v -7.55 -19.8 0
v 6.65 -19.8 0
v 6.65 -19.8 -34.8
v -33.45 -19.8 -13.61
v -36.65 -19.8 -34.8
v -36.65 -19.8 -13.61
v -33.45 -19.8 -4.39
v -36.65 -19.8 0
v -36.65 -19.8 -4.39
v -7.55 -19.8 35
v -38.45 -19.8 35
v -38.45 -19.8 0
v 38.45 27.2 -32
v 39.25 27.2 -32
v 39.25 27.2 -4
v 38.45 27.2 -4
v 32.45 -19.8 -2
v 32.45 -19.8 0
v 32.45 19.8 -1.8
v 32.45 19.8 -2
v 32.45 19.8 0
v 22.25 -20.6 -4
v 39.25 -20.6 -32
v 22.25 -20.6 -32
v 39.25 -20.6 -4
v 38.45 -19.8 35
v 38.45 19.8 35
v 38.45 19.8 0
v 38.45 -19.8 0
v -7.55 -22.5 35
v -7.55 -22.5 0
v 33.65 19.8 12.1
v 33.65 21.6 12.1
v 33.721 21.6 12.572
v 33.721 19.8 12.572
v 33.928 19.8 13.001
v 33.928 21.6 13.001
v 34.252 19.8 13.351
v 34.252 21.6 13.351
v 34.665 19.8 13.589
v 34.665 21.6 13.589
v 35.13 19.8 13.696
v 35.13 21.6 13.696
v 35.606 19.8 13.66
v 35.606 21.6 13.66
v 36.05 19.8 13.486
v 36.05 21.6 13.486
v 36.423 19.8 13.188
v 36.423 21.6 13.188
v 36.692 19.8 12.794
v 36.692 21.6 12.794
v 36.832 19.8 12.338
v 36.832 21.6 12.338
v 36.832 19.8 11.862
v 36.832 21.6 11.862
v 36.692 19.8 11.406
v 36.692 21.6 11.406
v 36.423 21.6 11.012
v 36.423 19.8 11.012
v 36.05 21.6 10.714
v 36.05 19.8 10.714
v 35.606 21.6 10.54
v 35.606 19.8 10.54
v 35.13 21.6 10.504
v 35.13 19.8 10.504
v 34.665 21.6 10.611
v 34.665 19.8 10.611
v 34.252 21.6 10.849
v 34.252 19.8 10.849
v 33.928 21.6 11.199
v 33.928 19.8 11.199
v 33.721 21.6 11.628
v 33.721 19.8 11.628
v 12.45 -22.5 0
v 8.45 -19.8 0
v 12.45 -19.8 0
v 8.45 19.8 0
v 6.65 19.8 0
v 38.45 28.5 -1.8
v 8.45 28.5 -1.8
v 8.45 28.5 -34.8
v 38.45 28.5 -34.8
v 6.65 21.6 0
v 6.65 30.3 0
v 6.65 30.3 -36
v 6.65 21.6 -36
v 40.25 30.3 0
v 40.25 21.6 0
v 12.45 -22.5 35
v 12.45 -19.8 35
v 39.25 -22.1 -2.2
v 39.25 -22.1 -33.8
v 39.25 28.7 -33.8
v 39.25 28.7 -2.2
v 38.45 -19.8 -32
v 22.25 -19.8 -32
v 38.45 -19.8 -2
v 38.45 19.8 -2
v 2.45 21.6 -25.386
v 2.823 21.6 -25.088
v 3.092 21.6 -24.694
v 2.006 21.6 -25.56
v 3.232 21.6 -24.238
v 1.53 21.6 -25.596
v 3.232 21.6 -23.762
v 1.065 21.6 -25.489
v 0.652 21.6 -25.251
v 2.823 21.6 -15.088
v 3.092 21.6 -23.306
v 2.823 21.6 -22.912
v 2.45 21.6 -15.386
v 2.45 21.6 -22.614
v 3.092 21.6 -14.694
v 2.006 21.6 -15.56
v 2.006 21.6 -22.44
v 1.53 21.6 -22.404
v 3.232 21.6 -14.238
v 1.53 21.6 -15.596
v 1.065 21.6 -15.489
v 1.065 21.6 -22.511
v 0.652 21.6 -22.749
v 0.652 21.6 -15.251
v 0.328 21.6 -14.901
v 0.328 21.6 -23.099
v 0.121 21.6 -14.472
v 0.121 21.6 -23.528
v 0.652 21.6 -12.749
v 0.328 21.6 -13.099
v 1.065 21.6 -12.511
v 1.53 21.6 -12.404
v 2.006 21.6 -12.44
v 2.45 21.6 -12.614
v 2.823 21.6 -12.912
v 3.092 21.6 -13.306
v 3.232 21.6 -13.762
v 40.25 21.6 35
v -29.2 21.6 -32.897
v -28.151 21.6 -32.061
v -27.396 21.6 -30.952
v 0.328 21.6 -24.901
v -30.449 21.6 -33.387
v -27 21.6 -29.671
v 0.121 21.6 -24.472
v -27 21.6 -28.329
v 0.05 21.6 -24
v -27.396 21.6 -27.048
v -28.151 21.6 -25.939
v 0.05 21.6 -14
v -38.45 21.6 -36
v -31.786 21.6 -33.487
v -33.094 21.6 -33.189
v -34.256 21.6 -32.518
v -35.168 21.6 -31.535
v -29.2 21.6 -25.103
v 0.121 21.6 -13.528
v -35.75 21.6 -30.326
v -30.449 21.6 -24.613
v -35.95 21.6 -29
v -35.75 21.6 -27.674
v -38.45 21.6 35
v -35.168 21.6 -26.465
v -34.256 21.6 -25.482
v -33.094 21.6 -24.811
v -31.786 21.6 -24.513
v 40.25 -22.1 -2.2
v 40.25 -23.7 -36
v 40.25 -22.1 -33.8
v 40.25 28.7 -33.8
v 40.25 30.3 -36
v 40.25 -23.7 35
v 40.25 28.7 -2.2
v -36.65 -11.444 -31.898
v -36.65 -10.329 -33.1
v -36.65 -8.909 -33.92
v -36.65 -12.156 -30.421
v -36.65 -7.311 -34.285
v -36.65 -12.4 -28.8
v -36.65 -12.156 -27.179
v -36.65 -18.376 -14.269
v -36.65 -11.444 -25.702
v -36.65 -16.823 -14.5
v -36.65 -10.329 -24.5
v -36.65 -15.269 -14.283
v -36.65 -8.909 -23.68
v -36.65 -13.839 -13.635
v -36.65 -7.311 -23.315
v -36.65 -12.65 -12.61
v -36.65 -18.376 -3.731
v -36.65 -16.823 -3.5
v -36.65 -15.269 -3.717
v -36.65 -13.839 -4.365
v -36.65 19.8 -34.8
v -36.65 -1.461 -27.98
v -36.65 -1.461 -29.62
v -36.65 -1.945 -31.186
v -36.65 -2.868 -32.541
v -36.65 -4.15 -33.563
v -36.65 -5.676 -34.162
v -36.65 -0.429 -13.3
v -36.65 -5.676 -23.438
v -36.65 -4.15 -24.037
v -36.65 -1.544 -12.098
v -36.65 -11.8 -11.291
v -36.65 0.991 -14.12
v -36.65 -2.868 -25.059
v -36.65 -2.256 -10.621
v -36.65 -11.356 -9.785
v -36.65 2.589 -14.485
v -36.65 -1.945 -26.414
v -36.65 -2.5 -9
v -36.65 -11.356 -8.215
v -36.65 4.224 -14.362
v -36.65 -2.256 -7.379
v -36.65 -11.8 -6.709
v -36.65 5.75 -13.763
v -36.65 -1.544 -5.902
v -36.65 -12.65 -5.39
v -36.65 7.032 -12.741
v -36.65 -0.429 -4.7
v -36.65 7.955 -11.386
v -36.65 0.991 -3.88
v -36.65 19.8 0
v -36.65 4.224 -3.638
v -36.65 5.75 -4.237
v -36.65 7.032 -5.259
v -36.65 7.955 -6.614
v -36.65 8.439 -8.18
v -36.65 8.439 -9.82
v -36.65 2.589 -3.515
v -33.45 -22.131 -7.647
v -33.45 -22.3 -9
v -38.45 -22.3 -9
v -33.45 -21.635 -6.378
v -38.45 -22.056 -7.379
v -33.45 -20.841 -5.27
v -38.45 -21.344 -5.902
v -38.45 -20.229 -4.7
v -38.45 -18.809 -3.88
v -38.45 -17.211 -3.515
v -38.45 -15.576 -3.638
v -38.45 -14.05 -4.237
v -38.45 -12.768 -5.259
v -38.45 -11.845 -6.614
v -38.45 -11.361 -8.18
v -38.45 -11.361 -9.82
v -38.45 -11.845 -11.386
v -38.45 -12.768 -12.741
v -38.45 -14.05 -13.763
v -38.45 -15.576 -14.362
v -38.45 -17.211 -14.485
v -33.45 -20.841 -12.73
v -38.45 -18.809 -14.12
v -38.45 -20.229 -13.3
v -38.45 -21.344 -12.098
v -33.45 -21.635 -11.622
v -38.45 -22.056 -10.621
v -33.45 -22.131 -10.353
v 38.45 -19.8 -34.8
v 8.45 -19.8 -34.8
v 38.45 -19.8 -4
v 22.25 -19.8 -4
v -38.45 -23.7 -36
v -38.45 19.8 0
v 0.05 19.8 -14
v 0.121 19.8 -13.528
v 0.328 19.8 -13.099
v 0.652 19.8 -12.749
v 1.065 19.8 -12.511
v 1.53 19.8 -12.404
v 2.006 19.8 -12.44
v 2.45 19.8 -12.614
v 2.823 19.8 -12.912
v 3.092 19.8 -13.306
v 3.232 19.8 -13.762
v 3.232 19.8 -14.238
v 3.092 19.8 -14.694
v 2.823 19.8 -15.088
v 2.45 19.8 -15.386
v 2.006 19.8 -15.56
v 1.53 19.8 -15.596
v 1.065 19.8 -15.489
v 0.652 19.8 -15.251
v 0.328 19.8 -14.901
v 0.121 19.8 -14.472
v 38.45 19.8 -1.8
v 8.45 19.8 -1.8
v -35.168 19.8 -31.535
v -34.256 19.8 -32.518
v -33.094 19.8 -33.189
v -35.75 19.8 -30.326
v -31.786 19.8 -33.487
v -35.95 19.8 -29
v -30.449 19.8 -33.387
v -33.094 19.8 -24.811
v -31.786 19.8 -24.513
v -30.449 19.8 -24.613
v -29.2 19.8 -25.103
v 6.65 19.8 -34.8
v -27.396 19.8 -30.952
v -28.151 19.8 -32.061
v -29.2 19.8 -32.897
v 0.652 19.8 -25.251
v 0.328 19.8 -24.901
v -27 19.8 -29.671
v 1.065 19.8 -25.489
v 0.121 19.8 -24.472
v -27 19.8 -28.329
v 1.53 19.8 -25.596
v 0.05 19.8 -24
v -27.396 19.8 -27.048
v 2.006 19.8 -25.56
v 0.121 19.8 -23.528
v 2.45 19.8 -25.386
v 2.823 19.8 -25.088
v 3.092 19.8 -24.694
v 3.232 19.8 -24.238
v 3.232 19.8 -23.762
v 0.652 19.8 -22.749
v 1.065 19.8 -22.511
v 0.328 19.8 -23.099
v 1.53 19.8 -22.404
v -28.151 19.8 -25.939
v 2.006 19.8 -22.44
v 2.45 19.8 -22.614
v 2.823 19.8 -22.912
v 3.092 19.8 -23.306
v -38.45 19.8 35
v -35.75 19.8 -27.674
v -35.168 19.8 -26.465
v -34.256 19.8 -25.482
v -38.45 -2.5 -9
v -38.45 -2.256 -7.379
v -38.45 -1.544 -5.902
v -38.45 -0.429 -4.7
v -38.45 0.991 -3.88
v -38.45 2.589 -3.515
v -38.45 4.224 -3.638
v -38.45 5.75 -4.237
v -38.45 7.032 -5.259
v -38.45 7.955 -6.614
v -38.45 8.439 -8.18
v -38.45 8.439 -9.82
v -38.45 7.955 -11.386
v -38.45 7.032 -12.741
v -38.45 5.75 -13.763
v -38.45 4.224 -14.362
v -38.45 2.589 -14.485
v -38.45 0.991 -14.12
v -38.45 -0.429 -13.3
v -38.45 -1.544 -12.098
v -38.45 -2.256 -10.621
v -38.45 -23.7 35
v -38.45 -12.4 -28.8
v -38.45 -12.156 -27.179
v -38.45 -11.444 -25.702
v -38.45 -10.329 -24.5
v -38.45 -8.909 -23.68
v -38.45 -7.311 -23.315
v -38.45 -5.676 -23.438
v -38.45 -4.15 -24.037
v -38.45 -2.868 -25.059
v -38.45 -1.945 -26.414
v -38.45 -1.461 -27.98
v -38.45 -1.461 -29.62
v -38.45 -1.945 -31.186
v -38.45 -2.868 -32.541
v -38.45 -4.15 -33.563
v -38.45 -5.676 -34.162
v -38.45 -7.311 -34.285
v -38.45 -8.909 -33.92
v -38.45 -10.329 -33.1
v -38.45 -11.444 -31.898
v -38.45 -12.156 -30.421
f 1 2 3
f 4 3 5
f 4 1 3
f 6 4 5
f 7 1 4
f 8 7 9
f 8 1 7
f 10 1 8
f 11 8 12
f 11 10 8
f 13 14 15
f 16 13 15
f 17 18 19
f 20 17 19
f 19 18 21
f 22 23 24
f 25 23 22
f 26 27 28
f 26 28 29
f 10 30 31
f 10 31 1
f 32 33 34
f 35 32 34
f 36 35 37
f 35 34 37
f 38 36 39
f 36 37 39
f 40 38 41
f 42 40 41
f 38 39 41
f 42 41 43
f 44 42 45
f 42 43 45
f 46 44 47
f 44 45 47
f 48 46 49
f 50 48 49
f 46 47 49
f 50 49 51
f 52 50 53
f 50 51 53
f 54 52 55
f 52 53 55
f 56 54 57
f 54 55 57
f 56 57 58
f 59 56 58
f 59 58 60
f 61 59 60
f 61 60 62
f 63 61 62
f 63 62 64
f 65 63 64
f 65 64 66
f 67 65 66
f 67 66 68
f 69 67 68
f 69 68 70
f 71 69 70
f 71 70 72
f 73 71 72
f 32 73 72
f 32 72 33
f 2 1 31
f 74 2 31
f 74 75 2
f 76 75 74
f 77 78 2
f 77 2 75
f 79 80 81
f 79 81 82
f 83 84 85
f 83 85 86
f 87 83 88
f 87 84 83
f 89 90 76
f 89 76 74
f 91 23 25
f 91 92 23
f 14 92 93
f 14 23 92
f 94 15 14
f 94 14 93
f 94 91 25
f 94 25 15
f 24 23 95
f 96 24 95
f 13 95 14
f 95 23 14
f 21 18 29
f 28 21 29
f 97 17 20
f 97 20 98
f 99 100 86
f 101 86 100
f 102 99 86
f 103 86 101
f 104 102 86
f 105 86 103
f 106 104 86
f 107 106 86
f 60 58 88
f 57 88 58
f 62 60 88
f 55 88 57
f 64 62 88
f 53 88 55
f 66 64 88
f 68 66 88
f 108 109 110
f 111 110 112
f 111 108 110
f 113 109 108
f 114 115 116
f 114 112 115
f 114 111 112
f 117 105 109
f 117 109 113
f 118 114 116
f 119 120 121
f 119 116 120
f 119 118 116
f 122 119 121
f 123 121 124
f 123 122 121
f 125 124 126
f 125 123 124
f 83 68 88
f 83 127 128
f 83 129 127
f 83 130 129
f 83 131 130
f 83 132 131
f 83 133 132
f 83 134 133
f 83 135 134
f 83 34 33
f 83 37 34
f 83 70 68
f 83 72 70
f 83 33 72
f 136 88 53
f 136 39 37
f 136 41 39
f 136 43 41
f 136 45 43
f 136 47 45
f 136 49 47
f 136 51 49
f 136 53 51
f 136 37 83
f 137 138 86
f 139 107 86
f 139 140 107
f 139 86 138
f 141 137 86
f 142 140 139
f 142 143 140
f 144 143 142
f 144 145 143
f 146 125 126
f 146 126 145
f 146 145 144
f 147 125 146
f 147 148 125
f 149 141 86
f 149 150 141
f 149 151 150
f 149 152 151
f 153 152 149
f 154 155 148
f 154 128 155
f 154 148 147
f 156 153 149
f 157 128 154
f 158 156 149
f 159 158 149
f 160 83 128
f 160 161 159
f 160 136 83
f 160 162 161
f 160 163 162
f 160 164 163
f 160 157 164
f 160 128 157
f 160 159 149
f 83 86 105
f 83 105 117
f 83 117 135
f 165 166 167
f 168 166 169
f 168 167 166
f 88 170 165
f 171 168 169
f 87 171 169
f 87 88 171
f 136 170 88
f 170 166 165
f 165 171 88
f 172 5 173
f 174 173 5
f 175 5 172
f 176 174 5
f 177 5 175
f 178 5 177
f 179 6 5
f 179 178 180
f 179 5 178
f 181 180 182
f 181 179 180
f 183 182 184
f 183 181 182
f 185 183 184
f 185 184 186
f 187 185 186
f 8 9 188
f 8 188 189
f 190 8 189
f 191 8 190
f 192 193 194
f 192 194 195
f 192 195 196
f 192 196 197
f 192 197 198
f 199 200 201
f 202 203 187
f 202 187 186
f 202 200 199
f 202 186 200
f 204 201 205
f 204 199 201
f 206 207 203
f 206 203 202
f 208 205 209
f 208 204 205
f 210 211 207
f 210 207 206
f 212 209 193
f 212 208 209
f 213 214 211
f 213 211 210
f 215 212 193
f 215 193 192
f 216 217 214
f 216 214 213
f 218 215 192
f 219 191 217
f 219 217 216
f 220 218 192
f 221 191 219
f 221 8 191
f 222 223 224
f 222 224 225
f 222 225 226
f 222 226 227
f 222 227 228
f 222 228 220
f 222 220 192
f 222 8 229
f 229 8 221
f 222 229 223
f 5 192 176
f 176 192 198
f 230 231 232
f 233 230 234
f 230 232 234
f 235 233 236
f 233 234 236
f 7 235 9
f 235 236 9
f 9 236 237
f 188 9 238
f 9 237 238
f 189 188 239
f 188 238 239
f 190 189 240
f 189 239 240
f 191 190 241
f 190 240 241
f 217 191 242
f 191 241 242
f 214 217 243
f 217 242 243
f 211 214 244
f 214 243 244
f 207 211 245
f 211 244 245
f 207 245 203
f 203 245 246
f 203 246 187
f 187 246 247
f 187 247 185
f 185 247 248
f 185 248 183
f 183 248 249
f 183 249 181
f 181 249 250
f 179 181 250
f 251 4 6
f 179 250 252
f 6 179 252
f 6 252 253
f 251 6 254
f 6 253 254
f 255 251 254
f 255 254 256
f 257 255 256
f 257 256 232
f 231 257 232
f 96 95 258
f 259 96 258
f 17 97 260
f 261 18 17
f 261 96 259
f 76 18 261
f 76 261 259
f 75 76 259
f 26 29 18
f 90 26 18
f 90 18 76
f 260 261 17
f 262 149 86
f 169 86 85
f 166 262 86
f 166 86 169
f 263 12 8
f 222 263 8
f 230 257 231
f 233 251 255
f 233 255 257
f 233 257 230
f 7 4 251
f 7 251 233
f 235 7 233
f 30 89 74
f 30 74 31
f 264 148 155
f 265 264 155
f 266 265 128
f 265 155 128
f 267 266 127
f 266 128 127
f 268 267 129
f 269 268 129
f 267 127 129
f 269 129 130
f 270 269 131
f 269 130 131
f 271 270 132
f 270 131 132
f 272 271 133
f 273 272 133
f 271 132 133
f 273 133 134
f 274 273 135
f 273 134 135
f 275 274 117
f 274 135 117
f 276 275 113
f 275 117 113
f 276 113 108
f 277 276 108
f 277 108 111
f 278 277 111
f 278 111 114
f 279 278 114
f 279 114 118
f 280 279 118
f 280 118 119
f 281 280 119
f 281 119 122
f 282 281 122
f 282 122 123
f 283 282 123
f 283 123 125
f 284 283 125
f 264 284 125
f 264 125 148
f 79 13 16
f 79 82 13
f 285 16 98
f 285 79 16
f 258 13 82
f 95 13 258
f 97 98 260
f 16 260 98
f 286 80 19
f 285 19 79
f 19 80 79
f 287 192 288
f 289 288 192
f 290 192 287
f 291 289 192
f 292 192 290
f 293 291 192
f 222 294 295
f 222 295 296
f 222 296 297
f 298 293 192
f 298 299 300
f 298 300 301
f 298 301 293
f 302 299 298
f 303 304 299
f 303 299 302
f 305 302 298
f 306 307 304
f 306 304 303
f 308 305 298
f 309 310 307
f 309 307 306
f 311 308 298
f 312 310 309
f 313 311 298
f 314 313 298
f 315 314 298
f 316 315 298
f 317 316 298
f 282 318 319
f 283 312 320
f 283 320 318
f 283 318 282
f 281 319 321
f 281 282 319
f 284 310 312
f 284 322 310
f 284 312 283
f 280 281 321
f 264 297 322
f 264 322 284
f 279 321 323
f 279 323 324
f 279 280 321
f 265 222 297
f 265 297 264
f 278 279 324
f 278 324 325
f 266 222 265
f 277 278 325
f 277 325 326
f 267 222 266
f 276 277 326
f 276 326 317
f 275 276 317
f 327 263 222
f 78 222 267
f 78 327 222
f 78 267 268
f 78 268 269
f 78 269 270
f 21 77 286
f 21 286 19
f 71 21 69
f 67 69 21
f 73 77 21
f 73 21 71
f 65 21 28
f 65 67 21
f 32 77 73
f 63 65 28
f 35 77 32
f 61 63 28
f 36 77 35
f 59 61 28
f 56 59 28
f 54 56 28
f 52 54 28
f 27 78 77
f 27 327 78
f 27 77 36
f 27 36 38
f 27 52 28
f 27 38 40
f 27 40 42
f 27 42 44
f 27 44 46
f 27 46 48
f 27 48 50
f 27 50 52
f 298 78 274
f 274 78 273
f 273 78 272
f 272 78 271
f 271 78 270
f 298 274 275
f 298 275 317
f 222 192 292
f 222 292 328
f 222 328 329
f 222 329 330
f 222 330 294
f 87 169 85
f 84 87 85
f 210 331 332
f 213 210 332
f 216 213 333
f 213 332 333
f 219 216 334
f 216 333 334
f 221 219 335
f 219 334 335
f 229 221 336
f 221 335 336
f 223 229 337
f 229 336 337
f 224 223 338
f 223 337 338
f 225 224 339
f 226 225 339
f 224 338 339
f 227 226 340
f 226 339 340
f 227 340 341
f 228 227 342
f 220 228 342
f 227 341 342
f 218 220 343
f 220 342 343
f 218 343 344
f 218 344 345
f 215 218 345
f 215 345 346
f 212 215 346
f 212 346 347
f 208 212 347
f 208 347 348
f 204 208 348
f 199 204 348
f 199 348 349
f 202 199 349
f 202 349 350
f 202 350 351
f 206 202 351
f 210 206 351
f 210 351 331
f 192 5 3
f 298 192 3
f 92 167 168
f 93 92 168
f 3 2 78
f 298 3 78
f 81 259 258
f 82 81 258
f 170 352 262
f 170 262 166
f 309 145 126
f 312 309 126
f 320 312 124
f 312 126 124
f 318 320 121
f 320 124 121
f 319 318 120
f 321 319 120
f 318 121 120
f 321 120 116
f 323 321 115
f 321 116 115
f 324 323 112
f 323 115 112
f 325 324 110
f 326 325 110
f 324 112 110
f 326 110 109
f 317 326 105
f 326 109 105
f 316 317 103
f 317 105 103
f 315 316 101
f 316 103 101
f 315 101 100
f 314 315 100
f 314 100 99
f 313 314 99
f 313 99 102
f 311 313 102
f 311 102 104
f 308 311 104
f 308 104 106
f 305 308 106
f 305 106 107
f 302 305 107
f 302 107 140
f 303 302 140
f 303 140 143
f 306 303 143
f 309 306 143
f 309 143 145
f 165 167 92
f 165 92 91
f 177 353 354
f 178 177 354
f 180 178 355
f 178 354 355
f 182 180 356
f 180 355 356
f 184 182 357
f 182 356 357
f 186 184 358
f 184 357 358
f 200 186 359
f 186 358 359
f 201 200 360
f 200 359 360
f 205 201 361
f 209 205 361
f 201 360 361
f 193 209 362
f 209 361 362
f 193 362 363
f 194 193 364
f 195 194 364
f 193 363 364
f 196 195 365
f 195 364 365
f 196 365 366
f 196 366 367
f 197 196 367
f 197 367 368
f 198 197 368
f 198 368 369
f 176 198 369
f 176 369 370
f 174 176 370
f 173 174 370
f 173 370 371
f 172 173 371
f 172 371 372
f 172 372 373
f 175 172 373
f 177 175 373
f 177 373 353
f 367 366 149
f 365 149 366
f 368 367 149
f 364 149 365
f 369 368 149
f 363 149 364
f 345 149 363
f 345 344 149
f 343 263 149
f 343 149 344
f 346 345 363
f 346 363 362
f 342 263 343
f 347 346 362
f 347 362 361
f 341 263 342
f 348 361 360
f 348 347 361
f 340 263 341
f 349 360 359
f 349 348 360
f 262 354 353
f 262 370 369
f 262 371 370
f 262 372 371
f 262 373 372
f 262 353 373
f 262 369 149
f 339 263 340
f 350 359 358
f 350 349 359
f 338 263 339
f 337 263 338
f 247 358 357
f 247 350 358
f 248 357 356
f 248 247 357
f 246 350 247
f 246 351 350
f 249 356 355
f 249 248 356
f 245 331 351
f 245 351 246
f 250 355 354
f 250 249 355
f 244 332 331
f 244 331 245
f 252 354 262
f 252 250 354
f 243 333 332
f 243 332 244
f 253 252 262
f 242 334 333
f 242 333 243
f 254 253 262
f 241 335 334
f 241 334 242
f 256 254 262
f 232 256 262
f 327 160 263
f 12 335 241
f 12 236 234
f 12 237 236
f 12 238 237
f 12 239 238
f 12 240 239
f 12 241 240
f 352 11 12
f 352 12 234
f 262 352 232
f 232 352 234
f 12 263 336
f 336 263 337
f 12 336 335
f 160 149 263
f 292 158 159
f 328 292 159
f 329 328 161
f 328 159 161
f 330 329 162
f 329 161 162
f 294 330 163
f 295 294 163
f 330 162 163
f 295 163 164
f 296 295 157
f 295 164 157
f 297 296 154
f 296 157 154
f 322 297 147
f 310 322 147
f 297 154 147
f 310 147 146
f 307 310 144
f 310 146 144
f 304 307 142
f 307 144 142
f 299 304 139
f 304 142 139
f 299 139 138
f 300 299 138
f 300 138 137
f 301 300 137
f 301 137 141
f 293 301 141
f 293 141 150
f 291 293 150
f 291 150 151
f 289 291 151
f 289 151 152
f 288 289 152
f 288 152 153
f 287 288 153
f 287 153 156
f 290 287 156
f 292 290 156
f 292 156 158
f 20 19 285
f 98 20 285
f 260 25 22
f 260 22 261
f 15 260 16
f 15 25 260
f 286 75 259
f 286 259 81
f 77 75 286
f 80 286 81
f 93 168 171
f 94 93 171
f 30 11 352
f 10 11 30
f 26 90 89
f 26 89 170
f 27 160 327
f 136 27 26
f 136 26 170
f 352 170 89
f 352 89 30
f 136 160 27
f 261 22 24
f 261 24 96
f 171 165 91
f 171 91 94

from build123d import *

# Parameters (mm, degrees)
F1_DEPTH  = 35
F0_W      = 1.8
F0_H      = 39.6
F2_DEPTH  = 36
F0_W_2    = 30
F0_H_2    = 6.9
F3_DEPTH  = 1.8
F4_W      = 47.8
F4_H      = 28
F5_DEPTH  = 18
F4_W_2    = 50.8
F4_H_2    = 31.6
F6_DEPTH  = 1
F7_W      = 43.3
F7_H      = 39.6
F7_W_2    = 30
F7_H_2    = 48.3
F8_DEPTH  = 1.2
F0_W_3    = 6
F9_DEPTH  = 2
F10_R     = 1.6
F11_DEPTH = 2
F12_R     = 5.5
F13_DEPTH = 5
F10_R_2   = 4.5
F14_DEPTH = 2


with BuildPart() as f1:
    # F0 (on Top) → F1 (new body)
    with BuildSketch(Plane.XY):
        Polygon((-38.45, 21.6), (-38.45, 19.8), (-36.65, 19.8), (6.65, 19.8), (8.45, 19.8), (8.45, 21.6), (6.65, 21.6), align=None)
        Polygon((8.45, 21.6), (8.45, 19.8), (32.45, 19.8), (38.45, 19.8), (38.45, 21.6), align=None)
        Polygon((-36.65, -19.8), (-38.45, -19.8), (-38.45, -23.7), (40.25, -23.7), (40.25, 21.6), (38.45, 21.6), (38.45, 19.8), (38.45, -19.8), (32.45, -19.8), (12.45, -19.8), (12.45, -22.5), (-7.55, -22.5), (-7.55, -19.8), align=None)
    extrude(amount=F1_DEPTH)

    # F0 (on Top) → F2 (join)
    with BuildSketch(Plane.XY):
        with Locations((-37.55, 0)):
            Rectangle(F0_W, F0_H)
        Polygon((-38.45, 21.6), (-38.45, 19.8), (-36.65, 19.8), (6.65, 19.8), (8.45, 19.8), (8.45, 21.6), (6.65, 21.6), align=None)
        Polygon((6.65, 30.3), (6.65, 21.6), (8.45, 21.6), (8.45, 28.5), (38.45, 28.5), (38.45, 21.6), (40.25, 21.6), (40.25, 30.3), align=None)
        Polygon((-36.65, -19.8), (-38.45, -19.8), (-38.45, -23.7), (40.25, -23.7), (40.25, 21.6), (38.45, 21.6), (38.45, 19.8), (38.45, -19.8), (32.45, -19.8), (12.45, -19.8), (12.45, -22.5), (-7.55, -22.5), (-7.55, -19.8), align=None)
        Polygon((8.45, -19.8), (6.65, -19.8), (-7.55, -19.8), (-7.55, -22.5), (12.45, -22.5), (12.45, -19.8), align=None)
        with Locations((7.55, 0)):
            Rectangle(F0_W, F0_H)
    extrude(amount=-F2_DEPTH)

    # F0 (on Top) → F3 (join)
    with BuildSketch(Plane.XY):
        with Locations((23.45, 25.05)):
            Rectangle(F0_W_2, F0_H_2)
        Polygon((8.45, 21.6), (8.45, 19.8), (32.45, 19.8), (38.45, 19.8), (38.45, 21.6), align=None)
    extrude(amount=-F3_DEPTH)

    # F4 (on face) → F5 (cut)
    with BuildSketch(Plane.YZ.offset(40.25)):
        with Locations((3.3, -18)):
            Rectangle(F4_W, F4_H)
    extrude(amount=-F5_DEPTH, mode=Mode.SUBTRACT)

    # F4 (on face) → F6 (cut)
    with BuildSketch(Plane.YZ.offset(40.25)):
        with Locations((3.3, -18)):
            Rectangle(F4_W_2, F4_H_2)
        with Locations((3.3, -18)):
            Rectangle(F4_W, F4_H, mode=Mode.SUBTRACT)
    extrude(amount=-F6_DEPTH, mode=Mode.SUBTRACT)

    # F7 (on face) → F8 (join)
    with BuildSketch(Plane(origin=(0, 0, -36), x_dir=(1, 0, 0), z_dir=(0, 0, -1))):
        with Locations((-15, 0)):
            Rectangle(F7_W, F7_H)
        with Locations((23.45, -4.35)):
            Rectangle(F7_W_2, F7_H_2)
    extrude(amount=-F8_DEPTH)

    # F0 (on Top) → F9 (join)
    with BuildSketch(Plane.XY):
        with Locations((35.45, 0)):
            Rectangle(F0_W_3, F0_H)
    extrude(amount=-F9_DEPTH)

    # F10 (on face) → F11 (cut)
    with BuildSketch(Plane(origin=(0, 21.6, 0), x_dir=(-1, 0, 0), z_dir=(0, 1, 0))):
        with Locations((-35.25, 12.1)):
            Circle(F10_R)
    extrude(amount=-F11_DEPTH, mode=Mode.SUBTRACT)

    # F12 (on face) → F13 (cut)
    with BuildSketch(Plane(origin=(-38.45, 0, 0), x_dir=(0, -1, 0), z_dir=(-1, 0, 0))):
        with Locations((-3, -9)):
            Circle(F12_R)
        with Locations((16.8, -9)):
            Circle(F12_R)
        with Locations((6.9, -28.8)):
            Circle(F12_R)
    extrude(amount=-F13_DEPTH, mode=Mode.SUBTRACT)

    # F10 (on face) → F14 (cut)
    with BuildSketch(Plane(origin=(0, 21.6, 0), x_dir=(-1, 0, 0), z_dir=(0, 1, 0))):
        with Locations((-1.65, -14)):
            Circle(F10_R)
        with Locations((-1.65, -24)):
            Circle(F10_R)
        with Locations((31.45, -29)):
            Circle(F10_R_2)
    extrude(amount=-F14_DEPTH, mode=Mode.SUBTRACT)


solid = f1.part
